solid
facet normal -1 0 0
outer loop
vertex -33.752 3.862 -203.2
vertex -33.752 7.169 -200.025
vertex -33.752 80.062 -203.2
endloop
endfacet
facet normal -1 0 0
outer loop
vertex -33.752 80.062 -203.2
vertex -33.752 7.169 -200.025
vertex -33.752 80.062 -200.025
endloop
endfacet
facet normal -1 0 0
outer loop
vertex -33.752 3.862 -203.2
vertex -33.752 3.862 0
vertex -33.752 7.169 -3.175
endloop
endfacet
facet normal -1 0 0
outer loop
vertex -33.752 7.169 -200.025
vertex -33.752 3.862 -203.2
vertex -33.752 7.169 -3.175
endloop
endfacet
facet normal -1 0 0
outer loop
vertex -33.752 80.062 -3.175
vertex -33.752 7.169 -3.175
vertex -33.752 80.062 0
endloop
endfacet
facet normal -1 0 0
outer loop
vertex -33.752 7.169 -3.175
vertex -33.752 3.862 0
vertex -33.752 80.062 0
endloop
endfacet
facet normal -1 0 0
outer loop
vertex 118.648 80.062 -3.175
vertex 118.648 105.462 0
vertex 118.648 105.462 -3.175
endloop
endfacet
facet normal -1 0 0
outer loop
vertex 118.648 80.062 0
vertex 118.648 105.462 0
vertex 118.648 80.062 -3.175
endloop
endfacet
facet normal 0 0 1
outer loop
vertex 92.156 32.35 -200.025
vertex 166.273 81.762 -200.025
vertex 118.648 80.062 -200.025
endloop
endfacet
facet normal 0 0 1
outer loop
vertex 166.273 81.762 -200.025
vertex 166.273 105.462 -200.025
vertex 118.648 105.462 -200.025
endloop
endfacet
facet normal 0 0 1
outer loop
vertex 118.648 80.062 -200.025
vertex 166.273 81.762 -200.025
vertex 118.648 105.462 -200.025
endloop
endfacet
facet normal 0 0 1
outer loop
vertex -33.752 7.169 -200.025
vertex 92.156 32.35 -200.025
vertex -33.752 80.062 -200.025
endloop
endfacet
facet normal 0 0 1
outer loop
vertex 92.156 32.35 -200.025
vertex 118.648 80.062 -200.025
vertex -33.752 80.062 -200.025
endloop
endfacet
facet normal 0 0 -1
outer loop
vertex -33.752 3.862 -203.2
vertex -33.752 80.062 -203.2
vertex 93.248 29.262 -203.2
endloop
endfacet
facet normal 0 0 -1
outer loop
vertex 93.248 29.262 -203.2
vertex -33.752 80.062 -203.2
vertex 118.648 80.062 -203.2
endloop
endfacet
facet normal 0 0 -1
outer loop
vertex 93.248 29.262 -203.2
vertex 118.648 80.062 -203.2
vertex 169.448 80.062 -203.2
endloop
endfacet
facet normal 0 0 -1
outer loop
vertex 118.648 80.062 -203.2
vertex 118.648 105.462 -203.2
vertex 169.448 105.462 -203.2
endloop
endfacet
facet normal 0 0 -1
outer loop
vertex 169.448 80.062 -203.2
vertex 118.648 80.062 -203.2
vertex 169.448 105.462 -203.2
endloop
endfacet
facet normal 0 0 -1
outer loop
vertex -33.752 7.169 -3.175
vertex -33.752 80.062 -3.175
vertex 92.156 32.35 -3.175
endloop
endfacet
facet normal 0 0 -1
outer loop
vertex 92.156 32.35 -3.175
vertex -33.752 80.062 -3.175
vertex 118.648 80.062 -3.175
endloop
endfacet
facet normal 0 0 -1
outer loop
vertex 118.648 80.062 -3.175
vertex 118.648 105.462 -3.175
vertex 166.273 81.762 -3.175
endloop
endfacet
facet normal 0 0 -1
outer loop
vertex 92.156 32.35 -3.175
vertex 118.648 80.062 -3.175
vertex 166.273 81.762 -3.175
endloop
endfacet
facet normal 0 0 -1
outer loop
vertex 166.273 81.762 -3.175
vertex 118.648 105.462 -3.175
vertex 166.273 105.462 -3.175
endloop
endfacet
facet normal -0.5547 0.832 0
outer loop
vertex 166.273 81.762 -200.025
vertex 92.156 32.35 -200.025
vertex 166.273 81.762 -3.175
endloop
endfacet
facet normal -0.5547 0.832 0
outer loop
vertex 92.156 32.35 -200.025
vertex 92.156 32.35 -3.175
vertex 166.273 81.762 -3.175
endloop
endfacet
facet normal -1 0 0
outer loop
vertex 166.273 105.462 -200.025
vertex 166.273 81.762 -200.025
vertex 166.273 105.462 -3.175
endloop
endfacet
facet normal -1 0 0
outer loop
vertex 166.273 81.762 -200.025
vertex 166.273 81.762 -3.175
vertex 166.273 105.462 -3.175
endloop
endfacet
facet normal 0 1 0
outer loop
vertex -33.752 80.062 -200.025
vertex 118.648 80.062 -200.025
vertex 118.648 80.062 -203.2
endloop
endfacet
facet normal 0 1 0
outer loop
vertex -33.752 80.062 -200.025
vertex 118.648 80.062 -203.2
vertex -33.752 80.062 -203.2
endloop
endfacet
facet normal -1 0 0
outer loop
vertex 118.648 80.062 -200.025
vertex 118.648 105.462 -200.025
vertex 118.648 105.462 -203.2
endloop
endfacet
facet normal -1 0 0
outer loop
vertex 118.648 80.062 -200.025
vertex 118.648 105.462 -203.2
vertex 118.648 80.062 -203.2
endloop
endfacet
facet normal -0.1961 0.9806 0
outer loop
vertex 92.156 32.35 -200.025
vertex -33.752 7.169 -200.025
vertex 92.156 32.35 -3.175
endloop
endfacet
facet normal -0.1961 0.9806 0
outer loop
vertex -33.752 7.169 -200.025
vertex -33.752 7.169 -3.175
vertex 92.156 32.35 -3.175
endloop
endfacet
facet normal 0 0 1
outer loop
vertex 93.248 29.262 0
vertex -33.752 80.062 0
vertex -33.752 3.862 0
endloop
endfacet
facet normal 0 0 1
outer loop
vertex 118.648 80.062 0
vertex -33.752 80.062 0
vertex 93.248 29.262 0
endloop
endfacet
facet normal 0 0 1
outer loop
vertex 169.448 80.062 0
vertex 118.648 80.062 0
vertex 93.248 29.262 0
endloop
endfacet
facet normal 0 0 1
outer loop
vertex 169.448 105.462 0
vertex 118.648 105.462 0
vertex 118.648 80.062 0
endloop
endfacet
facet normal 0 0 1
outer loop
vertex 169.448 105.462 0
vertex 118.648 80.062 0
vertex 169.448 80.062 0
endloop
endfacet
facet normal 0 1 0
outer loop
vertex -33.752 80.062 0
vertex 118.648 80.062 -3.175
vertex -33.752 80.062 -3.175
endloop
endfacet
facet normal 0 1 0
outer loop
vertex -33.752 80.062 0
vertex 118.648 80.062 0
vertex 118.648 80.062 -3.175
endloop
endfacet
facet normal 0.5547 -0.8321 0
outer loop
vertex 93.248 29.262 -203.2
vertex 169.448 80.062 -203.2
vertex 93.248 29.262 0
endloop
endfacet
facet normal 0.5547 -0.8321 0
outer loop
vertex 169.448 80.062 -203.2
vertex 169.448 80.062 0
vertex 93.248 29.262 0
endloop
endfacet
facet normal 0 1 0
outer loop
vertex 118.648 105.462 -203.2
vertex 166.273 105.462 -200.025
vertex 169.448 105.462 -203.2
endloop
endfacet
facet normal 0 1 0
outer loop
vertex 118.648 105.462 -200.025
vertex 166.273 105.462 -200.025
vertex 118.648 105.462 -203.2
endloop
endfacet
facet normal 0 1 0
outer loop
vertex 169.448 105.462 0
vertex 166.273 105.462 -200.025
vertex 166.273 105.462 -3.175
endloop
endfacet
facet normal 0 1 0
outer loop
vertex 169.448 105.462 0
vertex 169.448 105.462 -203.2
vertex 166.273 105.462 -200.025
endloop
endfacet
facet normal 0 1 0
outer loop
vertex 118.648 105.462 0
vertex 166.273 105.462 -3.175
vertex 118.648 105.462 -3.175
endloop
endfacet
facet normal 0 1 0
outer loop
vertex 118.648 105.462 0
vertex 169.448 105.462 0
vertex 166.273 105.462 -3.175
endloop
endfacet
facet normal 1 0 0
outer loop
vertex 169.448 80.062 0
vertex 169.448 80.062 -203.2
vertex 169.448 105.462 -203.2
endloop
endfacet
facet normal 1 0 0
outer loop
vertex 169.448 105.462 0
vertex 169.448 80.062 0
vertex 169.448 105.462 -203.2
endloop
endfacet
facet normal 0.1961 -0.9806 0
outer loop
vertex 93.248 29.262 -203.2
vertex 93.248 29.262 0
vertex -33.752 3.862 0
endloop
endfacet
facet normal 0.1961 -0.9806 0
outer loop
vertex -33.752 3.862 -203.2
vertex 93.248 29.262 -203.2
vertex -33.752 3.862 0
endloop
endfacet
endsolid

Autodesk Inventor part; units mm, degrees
ref_plane "YZ Plane" through (0, 0, 0) normal (1, 0, 0) x (0, 1, 0)
ref_plane "XZ Plane" through (0, 0, 0) normal (0, 1, 0) x (-1, 0, 0)
ref_plane "XY Plane" through (0, 0, 0) normal (0, 0, 1) x (1, 0, 0)
sketch "Sketch1" plane through (0, 0, 0) normal (0, 0, 1) x (1, 0, 0)
  line L0 (169.4484, 80.0625) -> (169.4484, 105.4625)
  line L1 (169.4484, 105.4625) -> (166.2734, 105.4625)
  line L2 (-33.7516, 3.8625) -> (-33.7516, 105.4625)
  line L3 (-33.7516, 105.4625) -> (166.2734, 105.4625)
  line L4 (-33.7516, 105.4625) -> (118.6484, 105.4625)
  line L5 (118.6484, 105.4625) -> (118.6484, 80.0625)
  line L6 (118.6484, 80.0625) -> (-33.7516, 80.0625)
  line L7 (-33.7516, 80.0625) -> (-33.7516, 105.4625)
  line L8 (169.4484, 80.0625) -> (93.2484, 29.2625)
  line L9 (93.2484, 29.2625) -> (-33.7516, 3.8625)
  line L10 (92.0098, 32.2527) -> (166.2734, 81.7618)
  line L11 (166.2734, 102.2875) -> (166.2734, 102.2875)
  line L12 (166.2734, 81.7618) -> (166.2734, 105.4625)
  line L13 (-33.7516, 7.1687) -> (92.1562, 32.3503)
  line L14 (118.6484, 105.4625) -> (166.2734, 105.4625)
  line L15 (-33.7516, 7.1687) -> (-33.7516, 80.0625)
  point P0 (0, 0)
  point P1 (-21.0516, 92.7625)
  point P2 (4.3484, 92.7625)
  dimension "d2" = 25.4
  dimension "d3" = 203.2
  dimension "d4" = 76.2
  dimension "d15" = 12.7
  dimension "d16" = 25.4
  dimension "d17" = 12.7
  dimension "d25" = 152.4
  dimension "d26" = 25.4
  dimension "d29" = 50.8
  dimension "d30" = 76.2
  dimension "d31" = 3.175
extrude "Extrusion1" add sketch "Sketch1" against normal blind 203.2 contours L8 L9 L2 L13 L10 L12 L1 L0
extrude "Extrusion3" add sketch "Sketch1" against normal blind 3.175
sketch "Sketch2" plane through (0, 0, -203.2) normal (0, 0, -1) x (-1, 0, 0)
  line L0 (-169.4484, 80.0625) -> (-169.4484, 105.4625) projected
  line L1 (33.7516, 3.8625) -> (-169.4484, 80.0625) projected
  line L2 (-169.4484, 105.4625) -> (-166.2734, 105.4625) projected
  line L3 (-166.2734, 105.4625) -> (33.7516, 105.4625)
  line L4 (33.7516, 105.4625) -> (33.7516, 3.8625)
  line L5 (-93.2484, 29.2625) -> (-169.4484, 80.0625) projected
  line L6 (33.7516, 3.8625) -> (-93.2484, 29.2625) projected
  line L7 (-166.2734, 81.7618) -> (-166.2734, 105.4625) projected
  line L8 (-93.2484, 29.2625) -> (-169.4484, 80.0625)
  line L9 (-169.4484, 80.0625) -> (-169.4484, 105.4625)
  line L10 (-169.4484, 105.4625) -> (-166.2734, 105.4625)
  line L11 (-166.2734, 105.4625) -> (-166.2734, 81.7618)
  line L12 (-92.1562, 32.3503) -> (-166.2734, 81.7618)
  line L13 (33.7516, 3.8625) -> (-93.2484, 29.2625)
  line L14 (-92.1562, 32.3503) -> (33.7516, 7.1687)
  point P0 (0, 0)
extrude "Extrusion4" add sketch "Sketch2" against normal blind 3.175
hole "Hole1" at (-21.0516, 92.7625, 0) at (4.3484, 92.7625, 0) direction (0, 0, -1) diameter 6.35 depth 254 tip angle 118
extrude "Extrusion5" cut sketch "Sketch1" against normal blind 228.6 contours L5 L6 L2 L3
properties part number "ramp1"
